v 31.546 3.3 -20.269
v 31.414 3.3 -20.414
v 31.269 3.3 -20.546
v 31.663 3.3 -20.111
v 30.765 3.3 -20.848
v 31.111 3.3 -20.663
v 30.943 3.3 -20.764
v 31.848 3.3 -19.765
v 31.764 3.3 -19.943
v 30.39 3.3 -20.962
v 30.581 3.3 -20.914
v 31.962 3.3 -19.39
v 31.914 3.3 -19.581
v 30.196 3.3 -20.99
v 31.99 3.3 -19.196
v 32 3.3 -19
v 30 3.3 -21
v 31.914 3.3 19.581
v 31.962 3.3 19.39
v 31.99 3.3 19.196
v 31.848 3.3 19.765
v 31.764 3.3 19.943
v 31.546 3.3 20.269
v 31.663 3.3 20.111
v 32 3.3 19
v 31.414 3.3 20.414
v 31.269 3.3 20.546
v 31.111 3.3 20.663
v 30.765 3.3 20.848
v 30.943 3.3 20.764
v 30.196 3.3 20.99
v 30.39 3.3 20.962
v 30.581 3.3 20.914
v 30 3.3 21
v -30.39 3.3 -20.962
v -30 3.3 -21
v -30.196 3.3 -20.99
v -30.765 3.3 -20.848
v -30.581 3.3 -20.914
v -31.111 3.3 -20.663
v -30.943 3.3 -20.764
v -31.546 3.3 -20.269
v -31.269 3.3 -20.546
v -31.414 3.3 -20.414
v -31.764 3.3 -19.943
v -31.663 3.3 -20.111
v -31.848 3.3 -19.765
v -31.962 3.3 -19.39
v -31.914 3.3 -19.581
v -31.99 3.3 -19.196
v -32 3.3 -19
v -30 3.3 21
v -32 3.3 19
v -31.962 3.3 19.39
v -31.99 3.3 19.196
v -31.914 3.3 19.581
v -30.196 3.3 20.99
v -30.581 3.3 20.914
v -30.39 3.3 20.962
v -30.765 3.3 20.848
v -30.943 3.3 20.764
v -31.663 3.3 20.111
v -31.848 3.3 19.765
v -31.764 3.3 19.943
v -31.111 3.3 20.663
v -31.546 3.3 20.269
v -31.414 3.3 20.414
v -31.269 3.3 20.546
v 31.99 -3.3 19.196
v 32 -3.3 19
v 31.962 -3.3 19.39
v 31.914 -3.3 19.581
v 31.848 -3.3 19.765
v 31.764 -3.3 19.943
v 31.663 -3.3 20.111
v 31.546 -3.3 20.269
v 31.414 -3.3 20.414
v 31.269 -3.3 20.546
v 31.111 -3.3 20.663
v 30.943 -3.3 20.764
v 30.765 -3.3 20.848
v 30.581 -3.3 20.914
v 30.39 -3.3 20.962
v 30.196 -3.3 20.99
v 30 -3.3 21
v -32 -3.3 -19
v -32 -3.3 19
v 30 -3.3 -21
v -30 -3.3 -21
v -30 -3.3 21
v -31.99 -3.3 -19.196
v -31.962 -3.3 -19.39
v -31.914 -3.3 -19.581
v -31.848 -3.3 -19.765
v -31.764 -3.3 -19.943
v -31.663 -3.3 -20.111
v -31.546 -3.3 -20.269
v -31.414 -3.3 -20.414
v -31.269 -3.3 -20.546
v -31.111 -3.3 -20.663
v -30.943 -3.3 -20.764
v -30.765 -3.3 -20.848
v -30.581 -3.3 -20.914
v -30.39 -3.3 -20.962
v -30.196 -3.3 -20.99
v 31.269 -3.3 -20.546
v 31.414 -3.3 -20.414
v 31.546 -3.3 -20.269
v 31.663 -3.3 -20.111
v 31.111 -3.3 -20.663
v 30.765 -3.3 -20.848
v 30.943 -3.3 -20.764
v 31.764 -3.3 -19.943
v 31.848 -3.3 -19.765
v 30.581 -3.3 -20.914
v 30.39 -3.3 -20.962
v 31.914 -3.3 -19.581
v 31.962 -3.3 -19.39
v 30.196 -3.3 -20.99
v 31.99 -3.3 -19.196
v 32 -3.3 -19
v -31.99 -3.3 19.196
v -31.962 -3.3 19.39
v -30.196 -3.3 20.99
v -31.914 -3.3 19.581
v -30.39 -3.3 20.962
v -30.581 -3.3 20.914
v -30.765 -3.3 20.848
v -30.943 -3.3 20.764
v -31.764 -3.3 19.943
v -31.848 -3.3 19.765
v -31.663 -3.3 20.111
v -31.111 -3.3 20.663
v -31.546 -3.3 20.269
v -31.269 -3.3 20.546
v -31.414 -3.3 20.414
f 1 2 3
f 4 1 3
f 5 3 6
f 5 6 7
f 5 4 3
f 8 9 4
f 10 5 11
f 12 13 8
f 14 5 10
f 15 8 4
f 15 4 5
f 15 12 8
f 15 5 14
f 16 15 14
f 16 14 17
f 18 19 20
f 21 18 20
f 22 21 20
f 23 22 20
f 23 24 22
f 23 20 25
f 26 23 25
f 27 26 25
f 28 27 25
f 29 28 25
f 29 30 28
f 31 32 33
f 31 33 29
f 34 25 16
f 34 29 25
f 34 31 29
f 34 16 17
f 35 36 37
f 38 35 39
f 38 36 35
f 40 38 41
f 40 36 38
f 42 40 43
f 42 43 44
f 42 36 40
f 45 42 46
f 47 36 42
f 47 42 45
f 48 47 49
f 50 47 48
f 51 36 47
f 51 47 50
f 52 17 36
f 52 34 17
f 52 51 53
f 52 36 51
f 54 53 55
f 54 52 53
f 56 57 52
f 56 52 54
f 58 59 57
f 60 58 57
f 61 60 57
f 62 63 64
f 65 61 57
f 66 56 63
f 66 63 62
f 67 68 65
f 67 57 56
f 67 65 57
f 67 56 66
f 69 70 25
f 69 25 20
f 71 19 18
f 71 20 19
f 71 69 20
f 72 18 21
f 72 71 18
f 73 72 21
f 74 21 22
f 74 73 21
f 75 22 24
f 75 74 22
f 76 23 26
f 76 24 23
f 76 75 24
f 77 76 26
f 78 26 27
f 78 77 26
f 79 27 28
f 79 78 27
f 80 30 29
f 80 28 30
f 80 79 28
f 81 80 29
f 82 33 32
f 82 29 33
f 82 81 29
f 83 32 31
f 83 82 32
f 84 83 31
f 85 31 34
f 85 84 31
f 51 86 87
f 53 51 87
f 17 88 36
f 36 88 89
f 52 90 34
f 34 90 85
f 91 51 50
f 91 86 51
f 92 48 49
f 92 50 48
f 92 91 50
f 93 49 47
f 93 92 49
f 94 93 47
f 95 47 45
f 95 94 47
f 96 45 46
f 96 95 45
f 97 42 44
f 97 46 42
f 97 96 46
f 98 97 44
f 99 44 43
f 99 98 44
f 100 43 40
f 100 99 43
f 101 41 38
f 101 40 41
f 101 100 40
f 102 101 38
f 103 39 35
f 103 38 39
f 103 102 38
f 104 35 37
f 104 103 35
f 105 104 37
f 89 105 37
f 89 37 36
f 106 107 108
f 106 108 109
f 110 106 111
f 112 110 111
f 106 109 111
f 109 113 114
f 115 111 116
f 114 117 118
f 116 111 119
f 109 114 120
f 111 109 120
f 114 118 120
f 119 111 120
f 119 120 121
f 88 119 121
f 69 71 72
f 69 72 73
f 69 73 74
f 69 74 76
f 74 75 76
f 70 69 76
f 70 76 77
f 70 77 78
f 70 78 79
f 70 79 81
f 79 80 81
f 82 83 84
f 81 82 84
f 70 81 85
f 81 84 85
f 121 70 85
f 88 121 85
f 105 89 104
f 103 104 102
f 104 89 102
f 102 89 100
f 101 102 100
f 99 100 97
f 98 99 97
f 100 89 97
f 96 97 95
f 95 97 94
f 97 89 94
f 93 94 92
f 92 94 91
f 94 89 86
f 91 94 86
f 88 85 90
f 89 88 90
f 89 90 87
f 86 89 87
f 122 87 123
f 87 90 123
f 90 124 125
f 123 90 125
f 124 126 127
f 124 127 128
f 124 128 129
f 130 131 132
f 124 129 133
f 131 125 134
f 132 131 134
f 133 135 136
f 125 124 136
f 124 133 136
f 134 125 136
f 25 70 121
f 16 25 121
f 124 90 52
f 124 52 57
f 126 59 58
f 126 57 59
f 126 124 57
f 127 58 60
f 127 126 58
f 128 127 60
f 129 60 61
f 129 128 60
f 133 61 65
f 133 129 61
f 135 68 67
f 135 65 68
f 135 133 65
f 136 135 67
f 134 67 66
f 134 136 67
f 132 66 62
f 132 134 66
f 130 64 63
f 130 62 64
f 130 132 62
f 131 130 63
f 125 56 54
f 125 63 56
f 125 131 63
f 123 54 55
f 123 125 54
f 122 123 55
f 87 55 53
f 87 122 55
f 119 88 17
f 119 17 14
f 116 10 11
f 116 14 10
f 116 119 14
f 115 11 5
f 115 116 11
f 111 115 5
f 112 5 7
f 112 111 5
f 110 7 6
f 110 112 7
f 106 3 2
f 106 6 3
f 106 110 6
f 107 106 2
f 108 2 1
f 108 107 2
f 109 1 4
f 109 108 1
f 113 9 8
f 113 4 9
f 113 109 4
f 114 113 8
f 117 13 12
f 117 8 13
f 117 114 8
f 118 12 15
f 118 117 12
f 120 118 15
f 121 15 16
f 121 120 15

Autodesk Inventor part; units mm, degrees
ref_plane "YZ Plane" through (0, 0, 0) normal (1, 0, 0) x (0, 1, 0)
ref_plane "XZ Plane" through (0, 0, 0) normal (0, 1, 0) x (-1, 0, 0)
ref_plane "XY Plane" through (0, 0, 0) normal (0, 0, 1) x (1, 0, 0)
sketch "Sketch1" plane through (0, 0, 0) normal (0, 1, 0) x (-1, 0, 0)
  line L0 (30, 21) -> (-30, 21)
  line L1 (-32, 19) -> (-32, -19)
  line L2 (-30, -21) -> (30, -21)
  line L3 (32, -19) -> (32, 19)
  line L4 (32, 21) -> (-32, -21) construction
  line L5 (-32, 21) -> (32, -21) construction
  arc A0 (30, -21) -> (32, -19) centre (30, -19) ccw
  arc A1 (32, 19) -> (30, 21) centre (30, 19) ccw
  arc A2 (-30, 21) -> (-32, 19) centre (-30, 19) ccw
  arc A3 (-32, -19) -> (-30, -21) centre (-30, -19) ccw
  point P0 (0, 0)
  dimension "d0" = 64
  dimension "d1" = 42
  dimension "d2" = 2
extrude "Extrusion1" add sketch "Sketch1" along normal mid plane 6.6
properties part number "Exploration_Industrials_All" material "Paper"
